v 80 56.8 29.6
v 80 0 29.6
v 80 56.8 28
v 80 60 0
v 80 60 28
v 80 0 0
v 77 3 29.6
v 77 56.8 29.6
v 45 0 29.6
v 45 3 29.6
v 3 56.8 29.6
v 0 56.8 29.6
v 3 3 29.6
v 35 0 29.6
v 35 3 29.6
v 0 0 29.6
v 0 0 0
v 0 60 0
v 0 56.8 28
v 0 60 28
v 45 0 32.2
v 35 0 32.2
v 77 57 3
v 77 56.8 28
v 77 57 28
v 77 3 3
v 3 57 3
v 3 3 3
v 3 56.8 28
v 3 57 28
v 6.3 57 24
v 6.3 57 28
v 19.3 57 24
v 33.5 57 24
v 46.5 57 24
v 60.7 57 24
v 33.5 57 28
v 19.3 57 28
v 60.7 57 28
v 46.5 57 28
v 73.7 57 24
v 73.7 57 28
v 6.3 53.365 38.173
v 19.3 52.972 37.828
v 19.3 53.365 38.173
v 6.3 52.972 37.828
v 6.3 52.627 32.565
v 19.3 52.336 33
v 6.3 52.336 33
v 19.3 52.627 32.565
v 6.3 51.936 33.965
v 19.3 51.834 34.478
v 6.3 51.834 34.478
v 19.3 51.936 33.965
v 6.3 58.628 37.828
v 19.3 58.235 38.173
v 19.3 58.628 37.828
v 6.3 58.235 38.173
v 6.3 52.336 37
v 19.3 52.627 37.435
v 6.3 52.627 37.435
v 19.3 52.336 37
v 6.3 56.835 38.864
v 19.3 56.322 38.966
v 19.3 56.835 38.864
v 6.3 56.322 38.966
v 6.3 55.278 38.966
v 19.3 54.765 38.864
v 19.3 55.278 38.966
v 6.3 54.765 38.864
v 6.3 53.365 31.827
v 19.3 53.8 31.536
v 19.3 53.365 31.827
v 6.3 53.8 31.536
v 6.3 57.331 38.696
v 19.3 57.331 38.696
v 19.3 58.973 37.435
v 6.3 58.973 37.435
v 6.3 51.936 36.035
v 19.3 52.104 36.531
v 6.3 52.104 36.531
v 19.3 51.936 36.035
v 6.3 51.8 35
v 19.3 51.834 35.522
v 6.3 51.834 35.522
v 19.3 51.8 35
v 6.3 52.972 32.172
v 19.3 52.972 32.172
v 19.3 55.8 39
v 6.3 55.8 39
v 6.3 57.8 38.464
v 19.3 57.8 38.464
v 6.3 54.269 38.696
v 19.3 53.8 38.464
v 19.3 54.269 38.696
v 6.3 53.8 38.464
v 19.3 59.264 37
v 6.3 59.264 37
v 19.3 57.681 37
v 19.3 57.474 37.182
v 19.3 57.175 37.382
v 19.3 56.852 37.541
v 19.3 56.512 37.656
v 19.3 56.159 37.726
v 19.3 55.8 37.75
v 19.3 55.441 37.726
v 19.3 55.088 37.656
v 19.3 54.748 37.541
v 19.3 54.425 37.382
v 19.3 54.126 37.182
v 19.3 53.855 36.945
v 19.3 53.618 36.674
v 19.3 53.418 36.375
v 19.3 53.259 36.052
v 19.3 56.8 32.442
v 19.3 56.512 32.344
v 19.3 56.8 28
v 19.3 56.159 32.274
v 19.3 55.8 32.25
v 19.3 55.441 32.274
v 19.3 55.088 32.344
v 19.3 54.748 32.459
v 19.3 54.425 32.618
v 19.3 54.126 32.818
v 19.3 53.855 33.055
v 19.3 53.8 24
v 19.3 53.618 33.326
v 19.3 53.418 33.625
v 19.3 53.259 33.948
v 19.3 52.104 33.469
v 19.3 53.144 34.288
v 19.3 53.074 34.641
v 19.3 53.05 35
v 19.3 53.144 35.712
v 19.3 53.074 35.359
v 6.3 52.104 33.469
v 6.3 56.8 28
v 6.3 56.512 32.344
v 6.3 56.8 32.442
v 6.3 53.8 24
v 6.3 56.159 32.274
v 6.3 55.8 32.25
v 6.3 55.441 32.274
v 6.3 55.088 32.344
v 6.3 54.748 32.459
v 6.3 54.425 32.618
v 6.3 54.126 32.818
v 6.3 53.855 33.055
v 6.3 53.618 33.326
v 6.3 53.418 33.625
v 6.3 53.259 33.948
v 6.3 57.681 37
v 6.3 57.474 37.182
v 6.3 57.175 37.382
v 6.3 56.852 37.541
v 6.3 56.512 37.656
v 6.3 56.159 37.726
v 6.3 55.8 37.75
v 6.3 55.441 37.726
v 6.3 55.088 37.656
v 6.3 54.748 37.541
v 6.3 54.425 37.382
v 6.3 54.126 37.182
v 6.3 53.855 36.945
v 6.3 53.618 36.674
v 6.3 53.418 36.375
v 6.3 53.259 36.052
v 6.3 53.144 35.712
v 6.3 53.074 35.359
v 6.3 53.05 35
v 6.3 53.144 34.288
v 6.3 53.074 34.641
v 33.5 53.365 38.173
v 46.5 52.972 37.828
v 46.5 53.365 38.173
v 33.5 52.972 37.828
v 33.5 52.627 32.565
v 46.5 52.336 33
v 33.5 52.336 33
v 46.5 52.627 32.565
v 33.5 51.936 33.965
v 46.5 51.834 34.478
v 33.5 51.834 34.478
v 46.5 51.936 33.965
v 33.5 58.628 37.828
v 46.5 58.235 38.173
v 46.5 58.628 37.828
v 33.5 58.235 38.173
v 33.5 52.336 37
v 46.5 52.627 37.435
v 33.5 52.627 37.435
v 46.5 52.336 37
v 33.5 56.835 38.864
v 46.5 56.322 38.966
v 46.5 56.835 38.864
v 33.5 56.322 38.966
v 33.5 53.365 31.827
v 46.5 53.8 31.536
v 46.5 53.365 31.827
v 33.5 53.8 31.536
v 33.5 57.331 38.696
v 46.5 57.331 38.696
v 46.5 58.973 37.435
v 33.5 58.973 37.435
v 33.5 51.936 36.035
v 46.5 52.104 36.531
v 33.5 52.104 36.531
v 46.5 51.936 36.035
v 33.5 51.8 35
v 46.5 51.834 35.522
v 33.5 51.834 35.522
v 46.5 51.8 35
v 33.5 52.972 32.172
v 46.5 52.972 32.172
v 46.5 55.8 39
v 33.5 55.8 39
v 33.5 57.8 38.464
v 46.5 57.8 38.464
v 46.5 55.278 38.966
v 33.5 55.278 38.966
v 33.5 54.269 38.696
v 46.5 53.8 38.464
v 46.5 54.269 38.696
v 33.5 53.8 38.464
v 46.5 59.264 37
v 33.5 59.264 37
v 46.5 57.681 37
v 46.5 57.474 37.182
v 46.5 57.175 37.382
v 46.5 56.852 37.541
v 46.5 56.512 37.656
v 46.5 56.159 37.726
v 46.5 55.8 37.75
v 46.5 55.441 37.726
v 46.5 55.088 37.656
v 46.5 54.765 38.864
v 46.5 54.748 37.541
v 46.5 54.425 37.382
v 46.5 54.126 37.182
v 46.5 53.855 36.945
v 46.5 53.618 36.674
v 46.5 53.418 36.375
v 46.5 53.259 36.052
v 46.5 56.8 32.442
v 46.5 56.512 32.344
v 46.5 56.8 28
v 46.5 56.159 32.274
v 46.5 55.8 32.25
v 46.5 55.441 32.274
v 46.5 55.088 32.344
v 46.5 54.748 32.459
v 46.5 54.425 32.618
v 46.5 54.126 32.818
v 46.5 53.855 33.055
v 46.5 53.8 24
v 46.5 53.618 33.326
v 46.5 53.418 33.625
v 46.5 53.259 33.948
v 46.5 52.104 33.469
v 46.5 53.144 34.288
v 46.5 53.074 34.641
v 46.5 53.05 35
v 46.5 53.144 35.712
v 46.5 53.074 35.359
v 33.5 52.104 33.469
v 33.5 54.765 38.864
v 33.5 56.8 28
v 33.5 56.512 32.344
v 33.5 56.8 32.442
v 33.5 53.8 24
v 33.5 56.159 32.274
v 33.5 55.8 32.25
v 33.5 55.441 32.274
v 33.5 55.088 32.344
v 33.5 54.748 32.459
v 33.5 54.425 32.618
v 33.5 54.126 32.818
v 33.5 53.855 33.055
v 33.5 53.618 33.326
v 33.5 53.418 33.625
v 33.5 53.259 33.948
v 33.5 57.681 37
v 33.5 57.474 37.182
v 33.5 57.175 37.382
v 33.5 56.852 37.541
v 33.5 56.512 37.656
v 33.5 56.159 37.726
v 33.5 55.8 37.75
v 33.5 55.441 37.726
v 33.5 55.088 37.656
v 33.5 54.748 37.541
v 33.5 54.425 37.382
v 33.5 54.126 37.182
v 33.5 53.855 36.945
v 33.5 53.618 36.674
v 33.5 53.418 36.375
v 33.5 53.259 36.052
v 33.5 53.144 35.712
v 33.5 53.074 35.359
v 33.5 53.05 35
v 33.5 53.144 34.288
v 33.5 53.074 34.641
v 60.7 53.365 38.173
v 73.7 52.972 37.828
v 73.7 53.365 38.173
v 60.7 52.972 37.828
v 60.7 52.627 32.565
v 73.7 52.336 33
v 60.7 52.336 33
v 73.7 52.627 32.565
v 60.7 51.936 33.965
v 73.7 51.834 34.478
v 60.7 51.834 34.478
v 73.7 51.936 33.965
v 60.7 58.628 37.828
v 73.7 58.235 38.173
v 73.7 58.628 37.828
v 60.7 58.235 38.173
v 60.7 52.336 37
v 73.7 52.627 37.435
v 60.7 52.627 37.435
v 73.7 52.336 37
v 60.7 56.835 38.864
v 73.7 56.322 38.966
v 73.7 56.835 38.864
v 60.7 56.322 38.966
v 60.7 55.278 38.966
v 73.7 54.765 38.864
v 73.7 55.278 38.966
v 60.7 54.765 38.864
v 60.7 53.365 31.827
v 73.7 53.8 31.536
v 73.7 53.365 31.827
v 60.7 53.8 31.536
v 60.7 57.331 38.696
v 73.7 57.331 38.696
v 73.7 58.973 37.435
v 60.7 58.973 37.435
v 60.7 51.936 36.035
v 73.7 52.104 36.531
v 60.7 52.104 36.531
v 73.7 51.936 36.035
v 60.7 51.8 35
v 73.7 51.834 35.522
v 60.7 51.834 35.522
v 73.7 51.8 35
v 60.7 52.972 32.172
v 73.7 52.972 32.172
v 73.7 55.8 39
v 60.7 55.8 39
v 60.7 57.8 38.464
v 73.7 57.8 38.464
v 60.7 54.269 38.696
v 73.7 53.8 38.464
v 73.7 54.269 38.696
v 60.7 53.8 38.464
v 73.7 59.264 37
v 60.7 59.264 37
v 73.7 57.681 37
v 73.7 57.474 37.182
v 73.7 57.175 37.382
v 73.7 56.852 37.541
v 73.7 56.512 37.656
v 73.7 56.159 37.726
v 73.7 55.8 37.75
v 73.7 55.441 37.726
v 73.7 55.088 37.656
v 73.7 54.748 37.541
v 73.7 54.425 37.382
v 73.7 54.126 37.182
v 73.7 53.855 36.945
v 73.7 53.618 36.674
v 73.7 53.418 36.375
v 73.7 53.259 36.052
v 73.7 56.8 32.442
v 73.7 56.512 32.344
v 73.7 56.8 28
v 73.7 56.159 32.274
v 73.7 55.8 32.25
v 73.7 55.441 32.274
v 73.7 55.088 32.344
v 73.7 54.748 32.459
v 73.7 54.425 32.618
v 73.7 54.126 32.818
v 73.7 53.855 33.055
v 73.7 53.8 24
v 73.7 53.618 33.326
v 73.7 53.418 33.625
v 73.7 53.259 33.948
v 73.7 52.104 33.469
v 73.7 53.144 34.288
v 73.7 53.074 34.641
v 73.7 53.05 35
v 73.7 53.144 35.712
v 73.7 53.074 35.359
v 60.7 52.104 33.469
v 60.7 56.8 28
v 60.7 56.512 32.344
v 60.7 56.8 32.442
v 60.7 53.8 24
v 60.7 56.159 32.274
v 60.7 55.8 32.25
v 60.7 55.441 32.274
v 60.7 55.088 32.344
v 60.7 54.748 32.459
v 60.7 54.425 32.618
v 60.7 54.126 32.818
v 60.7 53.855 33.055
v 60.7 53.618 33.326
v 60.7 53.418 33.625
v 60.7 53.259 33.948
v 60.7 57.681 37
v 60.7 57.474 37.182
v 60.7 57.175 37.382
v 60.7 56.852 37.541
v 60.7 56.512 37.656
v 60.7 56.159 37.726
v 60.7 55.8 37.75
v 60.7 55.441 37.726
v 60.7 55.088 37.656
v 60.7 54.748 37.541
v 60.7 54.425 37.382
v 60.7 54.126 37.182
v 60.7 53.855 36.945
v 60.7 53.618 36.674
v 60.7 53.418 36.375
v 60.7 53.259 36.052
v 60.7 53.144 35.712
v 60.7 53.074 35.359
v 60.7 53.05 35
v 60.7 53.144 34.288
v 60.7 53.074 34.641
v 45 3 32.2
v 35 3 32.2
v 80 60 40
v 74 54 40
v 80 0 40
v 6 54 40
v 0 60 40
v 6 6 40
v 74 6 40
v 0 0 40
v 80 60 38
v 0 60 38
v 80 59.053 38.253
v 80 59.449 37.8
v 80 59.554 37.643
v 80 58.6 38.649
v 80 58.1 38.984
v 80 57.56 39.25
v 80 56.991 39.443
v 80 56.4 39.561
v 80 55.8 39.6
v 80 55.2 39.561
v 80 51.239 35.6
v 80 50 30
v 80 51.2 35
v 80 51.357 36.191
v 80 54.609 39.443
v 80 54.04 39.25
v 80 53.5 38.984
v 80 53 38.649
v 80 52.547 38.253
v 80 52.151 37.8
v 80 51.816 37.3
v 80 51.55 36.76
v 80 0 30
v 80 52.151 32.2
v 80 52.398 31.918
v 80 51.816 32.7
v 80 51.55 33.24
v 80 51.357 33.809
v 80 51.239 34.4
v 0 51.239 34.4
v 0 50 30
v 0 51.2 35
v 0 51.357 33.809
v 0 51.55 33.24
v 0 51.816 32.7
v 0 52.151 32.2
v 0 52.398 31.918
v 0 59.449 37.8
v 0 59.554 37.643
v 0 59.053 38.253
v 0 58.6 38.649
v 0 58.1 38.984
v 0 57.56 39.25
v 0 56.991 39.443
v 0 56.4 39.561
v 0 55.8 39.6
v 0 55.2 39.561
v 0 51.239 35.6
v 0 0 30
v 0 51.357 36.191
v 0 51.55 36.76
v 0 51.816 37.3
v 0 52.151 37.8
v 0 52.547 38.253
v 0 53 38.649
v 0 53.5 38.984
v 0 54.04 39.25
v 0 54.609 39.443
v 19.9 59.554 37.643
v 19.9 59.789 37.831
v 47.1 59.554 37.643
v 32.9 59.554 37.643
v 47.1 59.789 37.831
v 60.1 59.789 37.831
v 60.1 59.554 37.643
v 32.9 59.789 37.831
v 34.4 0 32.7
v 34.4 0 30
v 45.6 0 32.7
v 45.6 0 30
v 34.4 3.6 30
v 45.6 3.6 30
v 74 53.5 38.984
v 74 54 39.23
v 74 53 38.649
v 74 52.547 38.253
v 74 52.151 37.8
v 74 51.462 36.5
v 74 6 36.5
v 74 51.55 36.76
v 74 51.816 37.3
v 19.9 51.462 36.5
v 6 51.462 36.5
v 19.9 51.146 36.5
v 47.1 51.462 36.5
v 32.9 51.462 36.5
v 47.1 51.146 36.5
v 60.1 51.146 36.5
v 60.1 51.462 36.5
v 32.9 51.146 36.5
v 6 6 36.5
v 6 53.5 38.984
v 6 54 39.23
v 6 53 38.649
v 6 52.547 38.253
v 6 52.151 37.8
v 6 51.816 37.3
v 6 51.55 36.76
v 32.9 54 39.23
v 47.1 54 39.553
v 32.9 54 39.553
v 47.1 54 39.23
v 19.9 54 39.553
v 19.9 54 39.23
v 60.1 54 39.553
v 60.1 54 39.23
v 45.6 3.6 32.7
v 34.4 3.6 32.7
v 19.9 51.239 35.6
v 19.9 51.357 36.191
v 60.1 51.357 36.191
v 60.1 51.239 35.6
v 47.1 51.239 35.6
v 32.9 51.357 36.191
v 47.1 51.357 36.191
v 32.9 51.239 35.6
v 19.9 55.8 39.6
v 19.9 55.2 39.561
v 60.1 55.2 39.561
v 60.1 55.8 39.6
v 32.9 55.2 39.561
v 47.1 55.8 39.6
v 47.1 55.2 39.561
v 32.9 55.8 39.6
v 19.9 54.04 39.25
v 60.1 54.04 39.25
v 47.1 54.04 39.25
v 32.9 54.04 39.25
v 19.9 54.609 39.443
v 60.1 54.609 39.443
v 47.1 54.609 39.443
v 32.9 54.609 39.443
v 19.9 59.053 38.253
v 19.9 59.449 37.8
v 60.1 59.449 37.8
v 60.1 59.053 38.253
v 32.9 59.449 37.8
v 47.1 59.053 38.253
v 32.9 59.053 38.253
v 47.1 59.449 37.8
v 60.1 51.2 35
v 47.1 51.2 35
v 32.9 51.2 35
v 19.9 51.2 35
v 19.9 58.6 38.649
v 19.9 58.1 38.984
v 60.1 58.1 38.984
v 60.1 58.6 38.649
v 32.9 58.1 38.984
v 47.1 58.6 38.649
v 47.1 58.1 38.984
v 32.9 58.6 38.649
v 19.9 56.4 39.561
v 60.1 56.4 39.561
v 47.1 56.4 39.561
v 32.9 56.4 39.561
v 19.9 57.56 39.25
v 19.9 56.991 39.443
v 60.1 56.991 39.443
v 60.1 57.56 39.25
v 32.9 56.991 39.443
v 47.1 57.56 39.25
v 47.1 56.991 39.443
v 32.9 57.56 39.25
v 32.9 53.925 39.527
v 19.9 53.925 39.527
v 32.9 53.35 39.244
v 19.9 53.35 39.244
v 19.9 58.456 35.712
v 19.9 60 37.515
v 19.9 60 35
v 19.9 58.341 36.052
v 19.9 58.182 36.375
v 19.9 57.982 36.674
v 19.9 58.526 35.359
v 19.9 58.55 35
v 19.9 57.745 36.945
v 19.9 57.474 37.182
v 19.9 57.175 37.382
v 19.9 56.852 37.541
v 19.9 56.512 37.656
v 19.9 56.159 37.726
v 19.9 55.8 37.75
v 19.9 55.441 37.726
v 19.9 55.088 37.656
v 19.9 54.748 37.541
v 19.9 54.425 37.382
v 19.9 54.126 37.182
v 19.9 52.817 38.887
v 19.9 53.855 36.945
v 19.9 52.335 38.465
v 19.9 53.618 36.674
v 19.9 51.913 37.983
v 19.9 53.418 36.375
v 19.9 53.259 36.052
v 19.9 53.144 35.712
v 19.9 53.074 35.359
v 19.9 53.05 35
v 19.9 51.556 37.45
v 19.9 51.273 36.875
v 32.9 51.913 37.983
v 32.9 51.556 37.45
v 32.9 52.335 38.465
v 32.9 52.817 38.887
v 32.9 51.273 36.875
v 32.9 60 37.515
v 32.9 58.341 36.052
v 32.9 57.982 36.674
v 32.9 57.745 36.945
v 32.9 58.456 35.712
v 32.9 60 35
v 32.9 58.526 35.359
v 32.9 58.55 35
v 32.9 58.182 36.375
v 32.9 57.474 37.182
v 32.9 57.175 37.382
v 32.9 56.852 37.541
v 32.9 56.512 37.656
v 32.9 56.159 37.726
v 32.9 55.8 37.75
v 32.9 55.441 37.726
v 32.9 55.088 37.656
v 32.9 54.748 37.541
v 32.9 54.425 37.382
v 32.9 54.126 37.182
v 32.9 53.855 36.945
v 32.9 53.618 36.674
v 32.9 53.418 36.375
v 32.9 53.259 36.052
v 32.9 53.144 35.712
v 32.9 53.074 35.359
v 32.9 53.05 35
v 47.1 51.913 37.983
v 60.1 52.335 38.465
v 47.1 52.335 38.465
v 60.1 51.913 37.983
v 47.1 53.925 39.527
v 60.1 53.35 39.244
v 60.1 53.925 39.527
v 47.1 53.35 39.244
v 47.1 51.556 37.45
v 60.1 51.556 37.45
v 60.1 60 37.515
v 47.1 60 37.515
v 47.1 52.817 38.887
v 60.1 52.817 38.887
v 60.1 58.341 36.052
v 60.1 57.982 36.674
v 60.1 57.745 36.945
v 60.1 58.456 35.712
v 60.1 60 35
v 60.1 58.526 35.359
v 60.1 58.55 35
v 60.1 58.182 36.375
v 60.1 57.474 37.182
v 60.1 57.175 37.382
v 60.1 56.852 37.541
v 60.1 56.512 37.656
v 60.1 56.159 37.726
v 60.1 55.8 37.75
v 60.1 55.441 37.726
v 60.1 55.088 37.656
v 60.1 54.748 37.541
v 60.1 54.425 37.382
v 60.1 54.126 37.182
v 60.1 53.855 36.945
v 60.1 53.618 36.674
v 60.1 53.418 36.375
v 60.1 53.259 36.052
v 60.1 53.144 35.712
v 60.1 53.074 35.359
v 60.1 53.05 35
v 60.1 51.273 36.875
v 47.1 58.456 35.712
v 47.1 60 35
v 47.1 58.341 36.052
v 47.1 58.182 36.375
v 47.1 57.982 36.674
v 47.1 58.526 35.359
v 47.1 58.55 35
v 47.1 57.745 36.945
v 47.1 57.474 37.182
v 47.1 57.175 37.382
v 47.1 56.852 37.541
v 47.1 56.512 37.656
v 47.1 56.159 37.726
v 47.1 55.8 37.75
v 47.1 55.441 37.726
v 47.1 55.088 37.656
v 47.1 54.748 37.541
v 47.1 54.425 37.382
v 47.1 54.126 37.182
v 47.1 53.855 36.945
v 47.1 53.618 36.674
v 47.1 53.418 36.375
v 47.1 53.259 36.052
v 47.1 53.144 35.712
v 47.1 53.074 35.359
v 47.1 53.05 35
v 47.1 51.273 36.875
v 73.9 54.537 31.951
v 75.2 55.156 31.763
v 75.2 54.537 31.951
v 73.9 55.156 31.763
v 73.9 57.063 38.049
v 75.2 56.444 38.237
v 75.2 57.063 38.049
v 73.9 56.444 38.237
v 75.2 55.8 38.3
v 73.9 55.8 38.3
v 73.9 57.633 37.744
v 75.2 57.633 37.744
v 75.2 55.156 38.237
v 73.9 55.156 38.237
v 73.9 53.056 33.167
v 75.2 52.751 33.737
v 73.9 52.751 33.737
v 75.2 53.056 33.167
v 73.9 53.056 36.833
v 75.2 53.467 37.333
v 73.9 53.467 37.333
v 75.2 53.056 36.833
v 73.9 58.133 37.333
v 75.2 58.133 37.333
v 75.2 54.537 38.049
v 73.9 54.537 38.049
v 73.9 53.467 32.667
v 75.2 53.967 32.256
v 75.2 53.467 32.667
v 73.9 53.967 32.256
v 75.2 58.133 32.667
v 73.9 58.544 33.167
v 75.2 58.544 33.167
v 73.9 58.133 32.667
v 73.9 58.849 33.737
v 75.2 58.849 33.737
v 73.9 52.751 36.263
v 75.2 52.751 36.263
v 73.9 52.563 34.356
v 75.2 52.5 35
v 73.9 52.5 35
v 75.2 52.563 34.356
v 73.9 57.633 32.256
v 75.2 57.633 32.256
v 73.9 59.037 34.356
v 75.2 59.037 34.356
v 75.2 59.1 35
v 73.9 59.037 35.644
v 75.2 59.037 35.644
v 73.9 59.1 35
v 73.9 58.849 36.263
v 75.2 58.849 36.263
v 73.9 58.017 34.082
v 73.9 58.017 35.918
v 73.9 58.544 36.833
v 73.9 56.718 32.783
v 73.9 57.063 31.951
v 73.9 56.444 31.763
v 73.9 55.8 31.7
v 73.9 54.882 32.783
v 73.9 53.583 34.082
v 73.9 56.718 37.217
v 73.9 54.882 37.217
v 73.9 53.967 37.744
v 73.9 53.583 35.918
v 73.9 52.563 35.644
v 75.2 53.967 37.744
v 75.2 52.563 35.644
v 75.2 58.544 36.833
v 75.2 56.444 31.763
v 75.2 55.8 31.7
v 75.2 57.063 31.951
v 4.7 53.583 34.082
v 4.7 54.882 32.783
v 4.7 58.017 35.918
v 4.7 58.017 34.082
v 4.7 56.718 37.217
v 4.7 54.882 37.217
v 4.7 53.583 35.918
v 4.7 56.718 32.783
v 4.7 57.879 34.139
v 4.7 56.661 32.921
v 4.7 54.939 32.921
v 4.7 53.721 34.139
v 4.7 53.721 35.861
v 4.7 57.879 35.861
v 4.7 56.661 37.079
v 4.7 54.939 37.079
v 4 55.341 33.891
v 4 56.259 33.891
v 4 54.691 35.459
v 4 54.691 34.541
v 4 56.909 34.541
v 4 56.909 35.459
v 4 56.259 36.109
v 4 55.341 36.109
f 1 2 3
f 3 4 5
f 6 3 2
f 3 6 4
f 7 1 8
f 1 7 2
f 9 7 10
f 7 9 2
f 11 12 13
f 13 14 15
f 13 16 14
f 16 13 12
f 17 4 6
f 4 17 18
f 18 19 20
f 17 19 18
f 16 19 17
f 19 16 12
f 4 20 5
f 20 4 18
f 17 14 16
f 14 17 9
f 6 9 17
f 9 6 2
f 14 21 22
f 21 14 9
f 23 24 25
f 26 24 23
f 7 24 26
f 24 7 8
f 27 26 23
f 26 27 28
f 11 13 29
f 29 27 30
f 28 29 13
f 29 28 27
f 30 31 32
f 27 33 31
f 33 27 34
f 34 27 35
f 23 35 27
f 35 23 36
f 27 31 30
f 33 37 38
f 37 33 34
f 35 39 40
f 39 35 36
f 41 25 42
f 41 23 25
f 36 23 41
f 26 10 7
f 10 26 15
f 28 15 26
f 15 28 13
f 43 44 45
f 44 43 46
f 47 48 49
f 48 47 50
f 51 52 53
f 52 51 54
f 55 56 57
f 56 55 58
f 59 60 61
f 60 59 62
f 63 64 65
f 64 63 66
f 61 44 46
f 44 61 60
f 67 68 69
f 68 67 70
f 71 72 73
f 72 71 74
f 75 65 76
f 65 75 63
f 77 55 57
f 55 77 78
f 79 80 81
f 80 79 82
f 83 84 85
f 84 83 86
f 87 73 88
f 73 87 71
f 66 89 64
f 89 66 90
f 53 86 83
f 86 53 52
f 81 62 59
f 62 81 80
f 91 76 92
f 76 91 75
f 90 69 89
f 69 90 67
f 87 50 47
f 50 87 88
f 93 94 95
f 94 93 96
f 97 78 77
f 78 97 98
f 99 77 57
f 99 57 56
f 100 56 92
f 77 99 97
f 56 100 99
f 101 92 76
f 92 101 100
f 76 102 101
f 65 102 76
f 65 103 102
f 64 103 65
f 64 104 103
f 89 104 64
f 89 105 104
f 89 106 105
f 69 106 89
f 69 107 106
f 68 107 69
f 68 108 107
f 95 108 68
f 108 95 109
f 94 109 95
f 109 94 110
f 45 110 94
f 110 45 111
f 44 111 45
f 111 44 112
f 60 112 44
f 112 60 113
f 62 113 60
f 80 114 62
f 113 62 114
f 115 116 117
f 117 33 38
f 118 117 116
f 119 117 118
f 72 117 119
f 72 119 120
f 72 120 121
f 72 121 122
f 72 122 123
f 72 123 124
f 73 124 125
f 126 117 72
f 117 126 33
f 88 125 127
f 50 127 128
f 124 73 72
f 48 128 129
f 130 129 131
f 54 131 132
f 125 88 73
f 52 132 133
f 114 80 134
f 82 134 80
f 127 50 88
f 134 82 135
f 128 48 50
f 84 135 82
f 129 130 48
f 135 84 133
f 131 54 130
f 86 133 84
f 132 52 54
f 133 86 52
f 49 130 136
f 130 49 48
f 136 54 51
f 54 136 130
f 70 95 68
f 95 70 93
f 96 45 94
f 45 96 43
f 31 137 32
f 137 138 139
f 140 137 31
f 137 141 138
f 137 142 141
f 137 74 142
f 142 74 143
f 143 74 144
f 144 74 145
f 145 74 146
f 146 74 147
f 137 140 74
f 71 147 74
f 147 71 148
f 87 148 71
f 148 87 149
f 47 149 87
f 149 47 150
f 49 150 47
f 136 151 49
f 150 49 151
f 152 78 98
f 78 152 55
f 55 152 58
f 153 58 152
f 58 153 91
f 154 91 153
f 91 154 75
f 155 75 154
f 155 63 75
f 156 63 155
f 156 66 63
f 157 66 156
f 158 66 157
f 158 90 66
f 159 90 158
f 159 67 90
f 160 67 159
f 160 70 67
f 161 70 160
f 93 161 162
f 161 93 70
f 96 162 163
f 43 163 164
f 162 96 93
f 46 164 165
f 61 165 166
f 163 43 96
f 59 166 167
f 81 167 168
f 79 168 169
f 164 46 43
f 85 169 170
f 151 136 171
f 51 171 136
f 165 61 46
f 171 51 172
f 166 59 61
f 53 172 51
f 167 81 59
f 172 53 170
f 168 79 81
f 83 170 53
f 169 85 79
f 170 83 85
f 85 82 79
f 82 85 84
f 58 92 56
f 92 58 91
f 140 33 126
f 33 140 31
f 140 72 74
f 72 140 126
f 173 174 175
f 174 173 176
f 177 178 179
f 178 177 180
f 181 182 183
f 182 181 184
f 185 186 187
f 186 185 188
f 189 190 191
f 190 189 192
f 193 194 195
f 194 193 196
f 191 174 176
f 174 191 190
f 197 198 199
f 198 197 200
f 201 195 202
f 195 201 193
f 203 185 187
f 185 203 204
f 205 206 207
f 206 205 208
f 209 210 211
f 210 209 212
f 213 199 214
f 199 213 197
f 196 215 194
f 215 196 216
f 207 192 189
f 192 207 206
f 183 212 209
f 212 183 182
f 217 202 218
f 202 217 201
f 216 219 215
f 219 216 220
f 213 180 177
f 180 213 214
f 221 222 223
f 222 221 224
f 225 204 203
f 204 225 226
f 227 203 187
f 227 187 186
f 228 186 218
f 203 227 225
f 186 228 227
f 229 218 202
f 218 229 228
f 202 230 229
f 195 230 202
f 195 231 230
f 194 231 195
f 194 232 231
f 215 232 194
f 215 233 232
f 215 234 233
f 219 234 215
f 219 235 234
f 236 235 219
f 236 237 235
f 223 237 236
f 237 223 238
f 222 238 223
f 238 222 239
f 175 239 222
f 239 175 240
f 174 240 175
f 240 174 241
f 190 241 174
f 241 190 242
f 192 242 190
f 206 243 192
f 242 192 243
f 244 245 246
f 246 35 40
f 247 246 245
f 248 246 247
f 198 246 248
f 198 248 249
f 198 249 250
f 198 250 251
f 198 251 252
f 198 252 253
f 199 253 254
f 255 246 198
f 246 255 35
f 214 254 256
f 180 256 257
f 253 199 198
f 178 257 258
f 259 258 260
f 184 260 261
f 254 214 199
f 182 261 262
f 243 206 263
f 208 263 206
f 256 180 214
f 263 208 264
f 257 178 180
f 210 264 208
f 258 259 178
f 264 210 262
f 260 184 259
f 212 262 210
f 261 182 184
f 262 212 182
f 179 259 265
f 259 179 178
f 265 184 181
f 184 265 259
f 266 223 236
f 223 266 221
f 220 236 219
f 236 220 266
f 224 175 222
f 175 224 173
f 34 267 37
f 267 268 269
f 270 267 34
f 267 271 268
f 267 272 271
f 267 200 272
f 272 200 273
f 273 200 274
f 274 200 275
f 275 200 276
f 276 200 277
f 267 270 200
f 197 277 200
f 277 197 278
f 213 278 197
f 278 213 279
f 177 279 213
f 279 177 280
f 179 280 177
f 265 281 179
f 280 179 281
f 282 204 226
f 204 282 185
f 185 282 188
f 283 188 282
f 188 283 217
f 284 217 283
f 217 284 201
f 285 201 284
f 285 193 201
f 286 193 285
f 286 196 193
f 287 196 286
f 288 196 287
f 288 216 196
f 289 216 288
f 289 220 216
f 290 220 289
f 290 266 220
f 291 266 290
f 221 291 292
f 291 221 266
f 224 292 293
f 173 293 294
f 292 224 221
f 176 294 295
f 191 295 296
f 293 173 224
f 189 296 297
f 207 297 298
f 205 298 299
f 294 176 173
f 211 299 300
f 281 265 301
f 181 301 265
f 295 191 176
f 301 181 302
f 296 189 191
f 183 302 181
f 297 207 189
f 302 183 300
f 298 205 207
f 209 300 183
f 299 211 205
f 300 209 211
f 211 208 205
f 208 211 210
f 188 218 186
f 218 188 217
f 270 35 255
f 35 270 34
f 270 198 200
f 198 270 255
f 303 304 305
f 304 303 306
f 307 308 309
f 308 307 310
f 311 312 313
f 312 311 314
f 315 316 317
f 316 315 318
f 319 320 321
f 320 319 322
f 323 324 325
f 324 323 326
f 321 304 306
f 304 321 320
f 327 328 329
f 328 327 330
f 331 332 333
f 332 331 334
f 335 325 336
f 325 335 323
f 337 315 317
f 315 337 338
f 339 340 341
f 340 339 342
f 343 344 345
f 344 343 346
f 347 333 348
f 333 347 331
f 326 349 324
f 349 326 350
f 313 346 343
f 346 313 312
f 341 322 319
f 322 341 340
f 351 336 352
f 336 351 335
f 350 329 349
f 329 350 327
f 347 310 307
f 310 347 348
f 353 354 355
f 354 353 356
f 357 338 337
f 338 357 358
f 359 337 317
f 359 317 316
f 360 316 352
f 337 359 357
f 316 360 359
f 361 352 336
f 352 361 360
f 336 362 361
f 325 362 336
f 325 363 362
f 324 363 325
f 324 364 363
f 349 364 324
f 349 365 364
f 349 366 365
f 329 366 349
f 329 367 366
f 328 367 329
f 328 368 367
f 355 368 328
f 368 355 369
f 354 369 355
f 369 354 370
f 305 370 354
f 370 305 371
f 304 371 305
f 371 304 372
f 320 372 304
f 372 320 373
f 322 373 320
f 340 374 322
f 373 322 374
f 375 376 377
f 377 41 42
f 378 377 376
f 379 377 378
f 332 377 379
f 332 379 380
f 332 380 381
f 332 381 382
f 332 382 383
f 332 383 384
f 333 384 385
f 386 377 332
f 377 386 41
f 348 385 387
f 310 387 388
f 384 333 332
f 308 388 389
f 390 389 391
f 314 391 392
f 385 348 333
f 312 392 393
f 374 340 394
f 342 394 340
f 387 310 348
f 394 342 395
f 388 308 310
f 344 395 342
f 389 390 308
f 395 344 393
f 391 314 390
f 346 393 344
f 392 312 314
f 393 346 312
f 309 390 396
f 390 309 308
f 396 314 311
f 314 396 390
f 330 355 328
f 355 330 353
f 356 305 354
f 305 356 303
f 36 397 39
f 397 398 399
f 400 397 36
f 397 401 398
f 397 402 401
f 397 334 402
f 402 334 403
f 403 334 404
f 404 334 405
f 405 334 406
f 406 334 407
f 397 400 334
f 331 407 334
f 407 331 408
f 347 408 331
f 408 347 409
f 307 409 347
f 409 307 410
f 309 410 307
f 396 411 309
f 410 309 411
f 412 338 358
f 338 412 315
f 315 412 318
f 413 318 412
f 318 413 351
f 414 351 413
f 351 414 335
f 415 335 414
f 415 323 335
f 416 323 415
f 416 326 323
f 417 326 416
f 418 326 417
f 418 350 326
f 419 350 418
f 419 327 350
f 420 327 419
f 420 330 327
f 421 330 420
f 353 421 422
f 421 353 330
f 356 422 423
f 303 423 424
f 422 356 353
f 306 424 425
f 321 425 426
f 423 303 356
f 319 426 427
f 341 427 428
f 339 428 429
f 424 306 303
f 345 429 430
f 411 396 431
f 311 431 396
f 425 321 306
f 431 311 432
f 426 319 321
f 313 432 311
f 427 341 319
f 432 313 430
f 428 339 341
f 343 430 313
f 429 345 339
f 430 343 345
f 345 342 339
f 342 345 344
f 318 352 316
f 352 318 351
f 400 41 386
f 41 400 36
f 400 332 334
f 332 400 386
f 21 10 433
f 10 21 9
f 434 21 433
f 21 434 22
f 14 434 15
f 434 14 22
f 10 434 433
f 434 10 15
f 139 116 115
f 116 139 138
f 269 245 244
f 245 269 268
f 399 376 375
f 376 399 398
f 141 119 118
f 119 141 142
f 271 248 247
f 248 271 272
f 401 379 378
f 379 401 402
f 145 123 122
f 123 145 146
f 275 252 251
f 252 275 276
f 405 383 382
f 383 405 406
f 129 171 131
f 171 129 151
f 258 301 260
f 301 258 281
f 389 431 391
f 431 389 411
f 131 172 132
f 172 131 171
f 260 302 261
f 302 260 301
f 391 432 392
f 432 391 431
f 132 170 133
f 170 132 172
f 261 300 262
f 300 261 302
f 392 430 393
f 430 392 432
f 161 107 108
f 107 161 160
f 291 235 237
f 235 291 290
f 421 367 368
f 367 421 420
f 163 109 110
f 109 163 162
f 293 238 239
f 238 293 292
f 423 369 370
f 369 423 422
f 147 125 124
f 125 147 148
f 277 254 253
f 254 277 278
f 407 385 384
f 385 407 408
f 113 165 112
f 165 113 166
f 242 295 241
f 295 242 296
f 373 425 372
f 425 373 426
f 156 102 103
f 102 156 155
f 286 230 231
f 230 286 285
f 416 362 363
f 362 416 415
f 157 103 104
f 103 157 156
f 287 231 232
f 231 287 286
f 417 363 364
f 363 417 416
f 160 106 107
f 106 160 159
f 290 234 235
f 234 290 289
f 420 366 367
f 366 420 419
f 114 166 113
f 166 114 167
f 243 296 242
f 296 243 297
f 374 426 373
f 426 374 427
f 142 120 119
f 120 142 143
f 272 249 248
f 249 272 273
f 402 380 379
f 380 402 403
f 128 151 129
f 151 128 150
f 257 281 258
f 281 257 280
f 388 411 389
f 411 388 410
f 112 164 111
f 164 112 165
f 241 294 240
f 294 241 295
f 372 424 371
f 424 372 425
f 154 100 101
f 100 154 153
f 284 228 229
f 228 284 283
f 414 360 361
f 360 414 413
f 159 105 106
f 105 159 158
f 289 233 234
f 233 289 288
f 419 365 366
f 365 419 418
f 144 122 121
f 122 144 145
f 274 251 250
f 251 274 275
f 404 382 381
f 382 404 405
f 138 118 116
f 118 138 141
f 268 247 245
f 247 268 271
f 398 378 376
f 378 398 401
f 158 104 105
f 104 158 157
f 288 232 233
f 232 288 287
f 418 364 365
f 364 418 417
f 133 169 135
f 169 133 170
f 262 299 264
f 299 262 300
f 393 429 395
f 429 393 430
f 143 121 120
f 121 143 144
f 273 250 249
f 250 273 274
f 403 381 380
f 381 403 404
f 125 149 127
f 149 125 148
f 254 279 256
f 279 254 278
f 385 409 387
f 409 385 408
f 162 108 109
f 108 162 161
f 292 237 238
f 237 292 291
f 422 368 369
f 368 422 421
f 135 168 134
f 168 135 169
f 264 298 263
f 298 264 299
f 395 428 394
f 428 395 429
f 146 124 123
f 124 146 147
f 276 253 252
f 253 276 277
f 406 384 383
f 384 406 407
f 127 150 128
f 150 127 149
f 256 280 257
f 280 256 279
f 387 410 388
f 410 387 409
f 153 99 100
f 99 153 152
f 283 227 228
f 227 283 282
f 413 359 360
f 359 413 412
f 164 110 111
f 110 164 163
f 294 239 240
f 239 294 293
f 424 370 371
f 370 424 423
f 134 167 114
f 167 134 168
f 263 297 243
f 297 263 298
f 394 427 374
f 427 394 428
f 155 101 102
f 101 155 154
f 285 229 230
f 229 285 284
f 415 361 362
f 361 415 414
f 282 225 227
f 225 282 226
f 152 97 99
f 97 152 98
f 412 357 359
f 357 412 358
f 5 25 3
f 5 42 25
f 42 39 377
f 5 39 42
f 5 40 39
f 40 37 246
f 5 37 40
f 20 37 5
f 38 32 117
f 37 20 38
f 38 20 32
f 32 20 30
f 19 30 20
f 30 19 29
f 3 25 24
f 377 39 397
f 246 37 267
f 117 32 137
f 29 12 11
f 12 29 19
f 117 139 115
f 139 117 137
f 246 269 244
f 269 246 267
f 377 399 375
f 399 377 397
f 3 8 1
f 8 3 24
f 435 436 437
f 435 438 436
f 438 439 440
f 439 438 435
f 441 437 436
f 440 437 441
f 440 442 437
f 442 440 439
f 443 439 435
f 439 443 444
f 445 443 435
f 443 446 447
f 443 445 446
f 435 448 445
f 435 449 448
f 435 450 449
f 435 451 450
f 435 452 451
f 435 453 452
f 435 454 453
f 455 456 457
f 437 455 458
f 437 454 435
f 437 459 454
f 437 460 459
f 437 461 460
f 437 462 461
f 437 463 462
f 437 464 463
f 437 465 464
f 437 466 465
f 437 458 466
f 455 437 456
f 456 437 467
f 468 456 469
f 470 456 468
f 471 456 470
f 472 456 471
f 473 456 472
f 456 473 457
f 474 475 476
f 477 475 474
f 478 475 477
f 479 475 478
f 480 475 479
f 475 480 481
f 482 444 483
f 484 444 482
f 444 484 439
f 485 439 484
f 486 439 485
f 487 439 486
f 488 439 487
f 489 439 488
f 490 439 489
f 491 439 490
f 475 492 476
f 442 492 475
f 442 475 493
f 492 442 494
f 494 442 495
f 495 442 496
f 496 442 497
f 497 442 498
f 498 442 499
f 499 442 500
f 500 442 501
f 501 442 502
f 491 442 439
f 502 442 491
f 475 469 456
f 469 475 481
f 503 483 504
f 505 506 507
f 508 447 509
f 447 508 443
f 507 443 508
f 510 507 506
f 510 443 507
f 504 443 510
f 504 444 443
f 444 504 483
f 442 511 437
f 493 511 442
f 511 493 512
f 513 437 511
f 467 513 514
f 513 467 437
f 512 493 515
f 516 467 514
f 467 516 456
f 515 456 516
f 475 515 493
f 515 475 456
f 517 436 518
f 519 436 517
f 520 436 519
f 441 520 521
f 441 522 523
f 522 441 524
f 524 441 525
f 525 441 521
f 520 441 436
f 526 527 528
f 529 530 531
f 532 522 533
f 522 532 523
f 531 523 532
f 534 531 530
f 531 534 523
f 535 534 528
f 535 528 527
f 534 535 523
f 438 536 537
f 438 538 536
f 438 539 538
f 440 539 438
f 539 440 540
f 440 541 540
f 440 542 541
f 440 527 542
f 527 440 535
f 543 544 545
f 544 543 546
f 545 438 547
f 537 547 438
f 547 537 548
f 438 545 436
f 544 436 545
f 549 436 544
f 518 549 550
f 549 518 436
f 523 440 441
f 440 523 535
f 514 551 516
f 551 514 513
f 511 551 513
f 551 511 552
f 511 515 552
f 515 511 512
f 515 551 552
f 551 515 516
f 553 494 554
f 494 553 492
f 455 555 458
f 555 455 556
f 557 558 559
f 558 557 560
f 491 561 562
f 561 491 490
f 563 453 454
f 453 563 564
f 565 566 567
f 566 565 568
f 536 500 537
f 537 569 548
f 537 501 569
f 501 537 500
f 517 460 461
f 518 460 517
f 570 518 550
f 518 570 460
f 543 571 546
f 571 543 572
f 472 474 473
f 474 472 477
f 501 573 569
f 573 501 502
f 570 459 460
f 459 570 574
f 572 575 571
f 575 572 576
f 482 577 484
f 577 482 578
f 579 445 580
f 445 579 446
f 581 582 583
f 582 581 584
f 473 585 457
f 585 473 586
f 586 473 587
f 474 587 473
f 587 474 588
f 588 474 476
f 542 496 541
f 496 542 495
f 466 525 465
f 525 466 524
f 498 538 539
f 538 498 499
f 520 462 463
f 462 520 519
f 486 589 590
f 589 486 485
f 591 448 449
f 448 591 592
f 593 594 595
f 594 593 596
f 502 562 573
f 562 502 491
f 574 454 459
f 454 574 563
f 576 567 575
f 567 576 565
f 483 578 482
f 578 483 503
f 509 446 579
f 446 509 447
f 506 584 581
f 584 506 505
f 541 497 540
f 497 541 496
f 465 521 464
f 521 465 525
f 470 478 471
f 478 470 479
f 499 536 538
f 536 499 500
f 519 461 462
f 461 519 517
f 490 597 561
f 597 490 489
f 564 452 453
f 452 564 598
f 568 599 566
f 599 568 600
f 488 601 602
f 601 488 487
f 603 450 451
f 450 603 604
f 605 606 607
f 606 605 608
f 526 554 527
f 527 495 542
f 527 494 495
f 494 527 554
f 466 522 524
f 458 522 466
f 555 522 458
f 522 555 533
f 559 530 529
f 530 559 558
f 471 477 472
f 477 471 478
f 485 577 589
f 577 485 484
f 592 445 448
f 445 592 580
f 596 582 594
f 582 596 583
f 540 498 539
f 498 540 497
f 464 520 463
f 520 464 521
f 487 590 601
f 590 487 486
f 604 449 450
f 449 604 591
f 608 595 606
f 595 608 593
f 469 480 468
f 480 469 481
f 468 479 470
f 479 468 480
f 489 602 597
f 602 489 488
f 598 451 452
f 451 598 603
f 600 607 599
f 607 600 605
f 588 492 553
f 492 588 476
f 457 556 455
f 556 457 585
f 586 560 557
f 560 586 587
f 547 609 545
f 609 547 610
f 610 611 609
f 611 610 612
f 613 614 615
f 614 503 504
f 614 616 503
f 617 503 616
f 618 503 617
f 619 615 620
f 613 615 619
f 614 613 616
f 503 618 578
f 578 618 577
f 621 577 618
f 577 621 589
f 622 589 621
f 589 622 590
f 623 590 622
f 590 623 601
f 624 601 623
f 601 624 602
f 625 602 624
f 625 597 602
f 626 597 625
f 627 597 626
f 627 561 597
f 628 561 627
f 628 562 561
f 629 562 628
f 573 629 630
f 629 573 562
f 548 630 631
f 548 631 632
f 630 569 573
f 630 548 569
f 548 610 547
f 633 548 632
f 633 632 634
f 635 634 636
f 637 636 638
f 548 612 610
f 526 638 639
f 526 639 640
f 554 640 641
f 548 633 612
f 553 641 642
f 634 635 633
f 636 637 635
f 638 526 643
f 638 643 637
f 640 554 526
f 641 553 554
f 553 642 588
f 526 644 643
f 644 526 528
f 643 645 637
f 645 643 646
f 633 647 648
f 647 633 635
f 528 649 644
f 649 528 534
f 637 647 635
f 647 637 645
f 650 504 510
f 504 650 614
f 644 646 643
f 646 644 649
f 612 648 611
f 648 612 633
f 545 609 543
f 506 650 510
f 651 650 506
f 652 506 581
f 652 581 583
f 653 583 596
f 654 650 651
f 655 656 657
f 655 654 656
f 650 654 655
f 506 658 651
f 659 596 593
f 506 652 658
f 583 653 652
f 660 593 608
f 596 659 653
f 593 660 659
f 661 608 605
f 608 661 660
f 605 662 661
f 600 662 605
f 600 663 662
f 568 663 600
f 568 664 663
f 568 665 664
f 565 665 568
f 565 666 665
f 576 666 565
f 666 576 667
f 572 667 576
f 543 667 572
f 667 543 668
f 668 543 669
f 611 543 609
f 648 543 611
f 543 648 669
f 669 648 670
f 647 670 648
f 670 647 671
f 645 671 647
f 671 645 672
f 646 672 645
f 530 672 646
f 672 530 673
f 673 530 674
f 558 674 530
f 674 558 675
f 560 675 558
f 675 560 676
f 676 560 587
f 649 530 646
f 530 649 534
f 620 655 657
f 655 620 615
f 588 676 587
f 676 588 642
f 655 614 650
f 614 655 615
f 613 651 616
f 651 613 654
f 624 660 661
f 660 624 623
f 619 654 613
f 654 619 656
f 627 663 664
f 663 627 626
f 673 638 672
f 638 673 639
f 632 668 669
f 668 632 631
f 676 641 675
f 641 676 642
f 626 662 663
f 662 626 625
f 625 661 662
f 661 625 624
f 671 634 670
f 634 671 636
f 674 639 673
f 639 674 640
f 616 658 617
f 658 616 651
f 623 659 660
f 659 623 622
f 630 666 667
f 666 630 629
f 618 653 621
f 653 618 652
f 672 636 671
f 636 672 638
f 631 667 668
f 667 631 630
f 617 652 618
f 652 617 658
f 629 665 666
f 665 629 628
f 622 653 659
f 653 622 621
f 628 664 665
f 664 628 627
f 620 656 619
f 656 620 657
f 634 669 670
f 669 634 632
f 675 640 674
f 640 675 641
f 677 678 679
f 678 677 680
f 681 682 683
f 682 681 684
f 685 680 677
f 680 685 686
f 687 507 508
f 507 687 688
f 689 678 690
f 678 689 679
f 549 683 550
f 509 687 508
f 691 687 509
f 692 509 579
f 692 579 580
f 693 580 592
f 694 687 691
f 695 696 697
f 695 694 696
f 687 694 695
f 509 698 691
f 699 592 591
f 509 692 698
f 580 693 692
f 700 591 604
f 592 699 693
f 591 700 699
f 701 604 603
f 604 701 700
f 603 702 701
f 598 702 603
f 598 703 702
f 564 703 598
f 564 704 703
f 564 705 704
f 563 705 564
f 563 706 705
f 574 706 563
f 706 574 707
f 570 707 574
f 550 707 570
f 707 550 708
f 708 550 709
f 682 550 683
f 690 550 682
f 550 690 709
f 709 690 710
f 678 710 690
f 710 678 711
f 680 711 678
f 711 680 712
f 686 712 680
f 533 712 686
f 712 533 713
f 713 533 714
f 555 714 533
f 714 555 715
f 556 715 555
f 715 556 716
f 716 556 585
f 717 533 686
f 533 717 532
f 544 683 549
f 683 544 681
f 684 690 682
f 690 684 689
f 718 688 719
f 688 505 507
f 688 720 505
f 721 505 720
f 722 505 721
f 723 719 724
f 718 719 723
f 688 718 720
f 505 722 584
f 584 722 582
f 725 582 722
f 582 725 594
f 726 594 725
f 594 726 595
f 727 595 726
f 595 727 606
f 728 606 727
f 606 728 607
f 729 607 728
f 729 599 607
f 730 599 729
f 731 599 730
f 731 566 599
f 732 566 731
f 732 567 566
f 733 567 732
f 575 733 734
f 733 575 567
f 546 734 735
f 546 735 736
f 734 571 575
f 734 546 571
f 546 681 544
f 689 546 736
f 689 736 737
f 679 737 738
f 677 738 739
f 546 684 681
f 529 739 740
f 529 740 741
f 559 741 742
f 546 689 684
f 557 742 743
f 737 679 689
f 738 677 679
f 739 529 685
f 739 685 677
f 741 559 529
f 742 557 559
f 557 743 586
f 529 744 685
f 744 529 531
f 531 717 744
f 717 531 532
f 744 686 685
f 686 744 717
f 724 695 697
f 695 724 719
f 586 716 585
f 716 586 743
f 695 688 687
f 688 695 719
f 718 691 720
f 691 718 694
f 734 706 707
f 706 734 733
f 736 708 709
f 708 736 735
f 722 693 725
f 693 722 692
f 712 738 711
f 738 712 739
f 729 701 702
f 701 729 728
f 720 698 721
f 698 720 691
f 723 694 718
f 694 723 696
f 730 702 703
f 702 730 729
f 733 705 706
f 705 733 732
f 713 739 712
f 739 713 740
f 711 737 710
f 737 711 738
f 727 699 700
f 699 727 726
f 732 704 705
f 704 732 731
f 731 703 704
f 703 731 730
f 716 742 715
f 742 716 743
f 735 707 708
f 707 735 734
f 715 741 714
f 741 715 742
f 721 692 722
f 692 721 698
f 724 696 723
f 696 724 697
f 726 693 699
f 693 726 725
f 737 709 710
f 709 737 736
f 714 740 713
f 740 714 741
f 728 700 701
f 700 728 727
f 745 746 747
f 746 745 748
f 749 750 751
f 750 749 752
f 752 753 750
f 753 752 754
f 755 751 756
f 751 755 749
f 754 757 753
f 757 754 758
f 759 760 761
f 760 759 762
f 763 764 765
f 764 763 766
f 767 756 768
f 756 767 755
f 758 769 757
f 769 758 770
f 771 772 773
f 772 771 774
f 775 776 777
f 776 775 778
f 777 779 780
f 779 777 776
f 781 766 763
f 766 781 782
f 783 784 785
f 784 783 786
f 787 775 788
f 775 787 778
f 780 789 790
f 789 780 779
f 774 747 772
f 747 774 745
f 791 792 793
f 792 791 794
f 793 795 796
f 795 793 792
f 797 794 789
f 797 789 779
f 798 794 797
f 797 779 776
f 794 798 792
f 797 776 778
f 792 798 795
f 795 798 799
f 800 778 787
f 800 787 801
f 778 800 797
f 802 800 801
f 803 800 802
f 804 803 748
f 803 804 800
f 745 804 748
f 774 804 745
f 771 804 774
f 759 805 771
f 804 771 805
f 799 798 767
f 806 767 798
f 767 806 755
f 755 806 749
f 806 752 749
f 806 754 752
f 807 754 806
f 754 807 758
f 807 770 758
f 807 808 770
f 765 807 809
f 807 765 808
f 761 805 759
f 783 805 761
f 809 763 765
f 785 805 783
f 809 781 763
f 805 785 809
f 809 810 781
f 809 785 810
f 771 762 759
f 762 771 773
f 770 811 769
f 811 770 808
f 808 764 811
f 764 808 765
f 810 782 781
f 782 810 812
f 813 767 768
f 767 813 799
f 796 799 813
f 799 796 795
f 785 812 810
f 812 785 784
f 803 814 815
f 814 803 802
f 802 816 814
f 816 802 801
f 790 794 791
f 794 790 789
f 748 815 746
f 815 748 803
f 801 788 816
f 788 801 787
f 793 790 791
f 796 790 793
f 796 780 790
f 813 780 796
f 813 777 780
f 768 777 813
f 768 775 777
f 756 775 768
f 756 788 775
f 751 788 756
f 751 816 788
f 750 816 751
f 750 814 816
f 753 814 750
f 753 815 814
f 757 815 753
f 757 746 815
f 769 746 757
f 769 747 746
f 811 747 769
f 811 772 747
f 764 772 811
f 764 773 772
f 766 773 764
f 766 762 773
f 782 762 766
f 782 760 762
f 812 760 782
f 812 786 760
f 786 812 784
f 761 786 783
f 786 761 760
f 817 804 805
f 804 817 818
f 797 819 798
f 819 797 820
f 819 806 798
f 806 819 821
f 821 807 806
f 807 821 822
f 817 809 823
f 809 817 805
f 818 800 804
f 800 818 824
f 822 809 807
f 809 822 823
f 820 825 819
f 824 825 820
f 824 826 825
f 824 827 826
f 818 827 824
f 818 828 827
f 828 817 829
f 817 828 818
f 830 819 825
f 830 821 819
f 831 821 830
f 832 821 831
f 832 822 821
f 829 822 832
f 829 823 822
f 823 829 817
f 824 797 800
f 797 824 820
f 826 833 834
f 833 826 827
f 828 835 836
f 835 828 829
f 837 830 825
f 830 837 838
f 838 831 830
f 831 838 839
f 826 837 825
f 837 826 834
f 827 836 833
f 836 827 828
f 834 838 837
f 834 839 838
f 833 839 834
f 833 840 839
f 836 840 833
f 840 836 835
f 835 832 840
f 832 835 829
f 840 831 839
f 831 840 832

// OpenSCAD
// Print-in-place hinged box, 80 x 60 x 40 mm closed.
// Printed closed in PLA (Bambu A1, 0.4 nozzle): base, lid and a captive
// hinge pin are separate bodies with 0.35-0.6 mm clearances, so the hinge
// breaks free by hand.  No supports: the lid underside bridges the cavity,
// the hinge barrels/pin use faceted (octagonal) lower surfaces, and all
// other downward faces are short bridges or rest on the body below.

/* [Part] */
part = "assembly"; // [assembly, box, lid, pin]

/* [Dimensions] */
box_w = 80;          // X, outside
box_d = 60;          // Y, outside (front y=0, back y=60)
box_h = 29.6;        // base height to its rim
lid_h = 10;          // lid height; lid bottom at z=30 (0.4 gap)
lid_z = 30;
wall = 3;
floor_t = 3;
total_h = 40;

hinge_y = 55.8;      // hinge axis, assembly coords
hinge_z = 35;
barrel_r = 4.0;
pin_r = 2.4;         // octagon circumradius
bore_r = 2.75;       // pin_r + 0.35 radial clearance
relief_r = 4.6;      // barrel_r + 0.6

// Alternating knuckles along the back edge (x intervals), 0.6 mm end gaps.
box_segs  = [[6.3, 19.3], [33.5, 46.5], [60.7, 73.7]];
lid_segs  = [[19.9, 32.9], [47.1, 60.1]];

cadverify_only = "";
module instance(name, part_name, unit = 1) {
    echo(cadverify_instance = [name, part_name, unit]);
    if (cadverify_only == "" || cadverify_only == name) children();
}

// ---------------------------------------------------------------- base (box)
module box_main() {
    difference() {
        union() {
            // shell: outer block minus open-top cavity
            difference() {
                cube([box_w, box_d, box_h]);
                translate([wall, wall, floor_t]) cube([box_w - 2 * wall, box_d - 2 * wall, box_h]);
            }
            // hinge knuckles (base) + support posts down to the back wall
            for (s = box_segs) {
                translate([s[0], hinge_y, hinge_z]) rotate([0, 90, 0])
                    cylinder(h = s[1] - s[0], r = barrel_r, $fn = 48);
                translate([s[0], 53.8, 24]) cube([s[1] - s[0], 6.2, 11.5]);
            }
            // front catch tooth (enters the socket in the lid)
            translate([35, 0, box_h]) cube([10, wall, 2.6]);
        }
        // pin bore through the base knuckles
        translate([-1, hinge_y, hinge_z]) rotate([0, 90, 0])
            cylinder(h = box_w + 2, r = bore_r, $fn = 48);
        // swing clearance notch: rear strip of wall/posts above z=28,
        // behind y=56.8, so the lid's rear lip clears it past 90 deg
        translate([-1, 56.8, 28]) cube([box_w + 2, 5, 9]);
    }
}

// ---------------------------------------------------------------- lid (local: z 0..10, hinge axis at z=5)
module lid_main() {
    union() {
        difference() {
            union() {
                // main slab, side profile (Y-Z) extruded along X.
                // Rear lower edge chamfered 50,0 -> 60,8 so the slab
                // swings clear of the base back wall.
                rotate([0, 90, 0])
                    linear_extrude(height = box_w)
                        polygon(points = [[0, 0], [0, 50], [-8, 60], [-10, 60], [-10, 0]]);
                // hinge knuckles (lid)
                for (s = lid_segs)
                    translate([s[0], hinge_y, 5]) rotate([0, 90, 0])
                        cylinder(h = s[1] - s[0], r = barrel_r, $fn = 48);
            }
            // recessed panel in the top face
            translate([6, 6, 6.5]) cube([68, 48, 4]);
            // front catch socket (tooth: x35..45, z assy 29.6..32.2)
            translate([34.4, -1, -0.5]) cube([11.2, 4.6, 3.2]);
            // clearance tunnel for the base knuckles / pin
            translate([-1, hinge_y, 5]) rotate([0, 90, 0])
                cylinder(h = box_w + 2, r = relief_r, $fn = 48);
            // pin bore through the lid knuckles
            translate([-1, hinge_y, 5]) rotate([0, 90, 0])
                cylinder(h = box_w + 2, r = bore_r, $fn = 48);
        }
        // webs joining lid knuckles to the slab: upper half-discs r=4.9
        // (stay above z=30.1 in assembly, clear of the base rim at 29.6)
        for (s = lid_segs)
            difference() {
                intersection() {
                    translate([s[0], hinge_y, 5]) rotate([0, 90, 0])
                        cylinder(h = s[1] - s[0], r = 4.9, $fn = 48);
                    translate([s[0], hinge_y - 10, 5]) cube([s[1] - s[0], 20, 5]);
                    translate([s[0], 0, 0]) cube([s[1] - s[0], box_d, lid_h]);
                }
                translate([s[0] - 1, hinge_y, 5]) rotate([0, 90, 0])
                    cylinder(h = s[1] - s[0] + 2, r = bore_r, $fn = 48);
            }
    }
}

// ---------------------------------------------------------------- pin
// Centred on its axis, local +Z from head (z=0) to tip (z=71.2).
module pin_geom() {
    union() {
        cylinder(h = 1.3, r = 3.3, $fn = 32);                    // head
        translate([0, 0, 1.0]) rotate([0, 0, 22.5])
            cylinder(h = 69.5, r = pin_r, $fn = 8);              // octagonal shaft
        translate([0, 0, 70.4]) rotate([0, 0, 22.5])
            cylinder(h = 0.8, r1 = pin_r, r2 = 1.2, $fn = 8);    // lead-in tip
    }
}
module pin_part() { translate([3.3, 3.3, 0]) pin_geom(); }

// ---------------------------------------------------------------- output
if (part == "box") {
    echo(cadverify_spec = [
        ["bounds", [[0, 0, 0], [box_w, box_d, hinge_z + barrel_r]]],
        ["bodies", 1],
        ["copies", 1],
        ["support_faces", [["bed", "-z", 4000]]],
        ["overhangs_allowed", [["hinge knuckles and pin bore print in place; faceted bore ceiling is a short internal bridge", [[5, 51, 30], [75, 60, 39.5]]], ["knuckle support ledge underside, 3.2 mm protrusion bridging to the back wall", [[5, 53, 23], [75, 58, 25]]]]],
        ["details", [
            ["cavity", "void", [[4, 4, 10], [76, 53, 29]], 0.95],
            ["front_wall", "thickness", [40, -1, 15], [0, 1, 0], 3],
            ["floor", "thickness", [40, 30, -1], [0, 0, 1], 3],
            ["box_knuckle", "material", [[7, 52, 33.5], [18, 53.8, 36.5]], 0.6],
            ["pin_bore", "void", [[8, 54.9, 34.1], [17, 56.7, 35.9]], 0.9],
            ["catch_tooth", "material", [[36, 0.5, 30], [44, 2.5, 32]], 0.85],
            ["hinge_knuckles", "view", [[4, 50, 28], [76, 60, 39.5]]]
        ]]
    ]);
    box_main();
} else if (part == "lid") {
    echo(cadverify_spec = [
        ["bounds", [[0, 0, 0], [box_w, box_d, lid_h]]],
        ["bodies", 1],
        ["copies", 1],
        ["support_faces", [["print_face", "-z", 3000]]],
        ["overhangs_allowed", [["lid hinge relief, knuckle bores and rear swing chamfer print in place around pin and box knuckles; ceilings are short internal bridges and the chamfer is 51 deg", [[0, 49, 0], [80, 60, 10]]], ["catch socket ceiling, 11 mm bridge across the socket", [[33, 0, 2], [47, 4, 3.5]]]]],
        ["details", [
            ["top_pocket", "void", [[7, 7, 6.6], [73, 53, 9.9]], 0.95],
            ["lid_slab", "thickness", [40, 30, 9], [0, 0, -1], 6.5],
            ["lid_knuckle", "material", [[21, 52, 3.5], [32, 53.8, 6.5]], 0.3],
            ["pin_bore", "void", [[22, 55.4, 4.6], [31, 56.2, 5.4]], 0.45],
            ["catch_socket", "void", [[35, 0.5, 0.2], [45, 2.5, 2.5]], 0.9],
            ["hinge_knuckles", "view", [[4, 50, 0], [76, 60, 10]]]
        ]]
    ]);
    lid_main();
} else if (part == "pin") {
    echo(cadverify_spec = [
        ["bounds", [[0, 0, 0], [6.6, 6.6, 71.2]]],
        ["bodies", 1],
        ["copies", 1],
        ["support_faces", [["head_base", "-z", 30]]],
        ["overhangs_allowed", []],
        ["details", [
            ["pin_shaft", "material", [[2, 2, 10], [4.6, 4.6, 20]], 0.9],
            ["pin_head", "material", [[1, 1, 0.1], [5.6, 5.6, 1.2]], 0.75],
            ["pin_length", "thickness", [1.2, 3.3, 72], [0, 0, -1], 71.2],
            ["pin_head_view", "view", [[0, 0, 0], [6.6, 6.6, 2]]]
        ]]
    ]);
    pin_part();
} else if (part == "assembly") {
    echo(cadverify_spec = [
        ["bounds", [[0, 0, 0], [box_w, box_d, total_h]]],
        ["support_faces", [["bed", "-z", 4000]]],
        ["allowed_interferences", []],
        ["motions", [
            ["lid_swing", ["lid"], "rotate", [0, hinge_y, hinge_z], [-1, 0, 0], [0, 110]]
        ]],
        ["assembly_order", [
            [["base"], [0, 0, 0]],
            [["pin"], [-1, 0, 0]],
            [["lid"], [0, 0, -1], ["rotate", [0, hinge_y, hinge_z], [1, 0, 0], 110]]
        ]]
    ]);
    instance("base", "box") box_main();
    instance("lid", "lid") translate([0, 0, lid_z]) lid_main();
    instance("pin", "pin") translate([75.2, hinge_y, hinge_z]) rotate([0, -90, 0]) pin_geom();
}
